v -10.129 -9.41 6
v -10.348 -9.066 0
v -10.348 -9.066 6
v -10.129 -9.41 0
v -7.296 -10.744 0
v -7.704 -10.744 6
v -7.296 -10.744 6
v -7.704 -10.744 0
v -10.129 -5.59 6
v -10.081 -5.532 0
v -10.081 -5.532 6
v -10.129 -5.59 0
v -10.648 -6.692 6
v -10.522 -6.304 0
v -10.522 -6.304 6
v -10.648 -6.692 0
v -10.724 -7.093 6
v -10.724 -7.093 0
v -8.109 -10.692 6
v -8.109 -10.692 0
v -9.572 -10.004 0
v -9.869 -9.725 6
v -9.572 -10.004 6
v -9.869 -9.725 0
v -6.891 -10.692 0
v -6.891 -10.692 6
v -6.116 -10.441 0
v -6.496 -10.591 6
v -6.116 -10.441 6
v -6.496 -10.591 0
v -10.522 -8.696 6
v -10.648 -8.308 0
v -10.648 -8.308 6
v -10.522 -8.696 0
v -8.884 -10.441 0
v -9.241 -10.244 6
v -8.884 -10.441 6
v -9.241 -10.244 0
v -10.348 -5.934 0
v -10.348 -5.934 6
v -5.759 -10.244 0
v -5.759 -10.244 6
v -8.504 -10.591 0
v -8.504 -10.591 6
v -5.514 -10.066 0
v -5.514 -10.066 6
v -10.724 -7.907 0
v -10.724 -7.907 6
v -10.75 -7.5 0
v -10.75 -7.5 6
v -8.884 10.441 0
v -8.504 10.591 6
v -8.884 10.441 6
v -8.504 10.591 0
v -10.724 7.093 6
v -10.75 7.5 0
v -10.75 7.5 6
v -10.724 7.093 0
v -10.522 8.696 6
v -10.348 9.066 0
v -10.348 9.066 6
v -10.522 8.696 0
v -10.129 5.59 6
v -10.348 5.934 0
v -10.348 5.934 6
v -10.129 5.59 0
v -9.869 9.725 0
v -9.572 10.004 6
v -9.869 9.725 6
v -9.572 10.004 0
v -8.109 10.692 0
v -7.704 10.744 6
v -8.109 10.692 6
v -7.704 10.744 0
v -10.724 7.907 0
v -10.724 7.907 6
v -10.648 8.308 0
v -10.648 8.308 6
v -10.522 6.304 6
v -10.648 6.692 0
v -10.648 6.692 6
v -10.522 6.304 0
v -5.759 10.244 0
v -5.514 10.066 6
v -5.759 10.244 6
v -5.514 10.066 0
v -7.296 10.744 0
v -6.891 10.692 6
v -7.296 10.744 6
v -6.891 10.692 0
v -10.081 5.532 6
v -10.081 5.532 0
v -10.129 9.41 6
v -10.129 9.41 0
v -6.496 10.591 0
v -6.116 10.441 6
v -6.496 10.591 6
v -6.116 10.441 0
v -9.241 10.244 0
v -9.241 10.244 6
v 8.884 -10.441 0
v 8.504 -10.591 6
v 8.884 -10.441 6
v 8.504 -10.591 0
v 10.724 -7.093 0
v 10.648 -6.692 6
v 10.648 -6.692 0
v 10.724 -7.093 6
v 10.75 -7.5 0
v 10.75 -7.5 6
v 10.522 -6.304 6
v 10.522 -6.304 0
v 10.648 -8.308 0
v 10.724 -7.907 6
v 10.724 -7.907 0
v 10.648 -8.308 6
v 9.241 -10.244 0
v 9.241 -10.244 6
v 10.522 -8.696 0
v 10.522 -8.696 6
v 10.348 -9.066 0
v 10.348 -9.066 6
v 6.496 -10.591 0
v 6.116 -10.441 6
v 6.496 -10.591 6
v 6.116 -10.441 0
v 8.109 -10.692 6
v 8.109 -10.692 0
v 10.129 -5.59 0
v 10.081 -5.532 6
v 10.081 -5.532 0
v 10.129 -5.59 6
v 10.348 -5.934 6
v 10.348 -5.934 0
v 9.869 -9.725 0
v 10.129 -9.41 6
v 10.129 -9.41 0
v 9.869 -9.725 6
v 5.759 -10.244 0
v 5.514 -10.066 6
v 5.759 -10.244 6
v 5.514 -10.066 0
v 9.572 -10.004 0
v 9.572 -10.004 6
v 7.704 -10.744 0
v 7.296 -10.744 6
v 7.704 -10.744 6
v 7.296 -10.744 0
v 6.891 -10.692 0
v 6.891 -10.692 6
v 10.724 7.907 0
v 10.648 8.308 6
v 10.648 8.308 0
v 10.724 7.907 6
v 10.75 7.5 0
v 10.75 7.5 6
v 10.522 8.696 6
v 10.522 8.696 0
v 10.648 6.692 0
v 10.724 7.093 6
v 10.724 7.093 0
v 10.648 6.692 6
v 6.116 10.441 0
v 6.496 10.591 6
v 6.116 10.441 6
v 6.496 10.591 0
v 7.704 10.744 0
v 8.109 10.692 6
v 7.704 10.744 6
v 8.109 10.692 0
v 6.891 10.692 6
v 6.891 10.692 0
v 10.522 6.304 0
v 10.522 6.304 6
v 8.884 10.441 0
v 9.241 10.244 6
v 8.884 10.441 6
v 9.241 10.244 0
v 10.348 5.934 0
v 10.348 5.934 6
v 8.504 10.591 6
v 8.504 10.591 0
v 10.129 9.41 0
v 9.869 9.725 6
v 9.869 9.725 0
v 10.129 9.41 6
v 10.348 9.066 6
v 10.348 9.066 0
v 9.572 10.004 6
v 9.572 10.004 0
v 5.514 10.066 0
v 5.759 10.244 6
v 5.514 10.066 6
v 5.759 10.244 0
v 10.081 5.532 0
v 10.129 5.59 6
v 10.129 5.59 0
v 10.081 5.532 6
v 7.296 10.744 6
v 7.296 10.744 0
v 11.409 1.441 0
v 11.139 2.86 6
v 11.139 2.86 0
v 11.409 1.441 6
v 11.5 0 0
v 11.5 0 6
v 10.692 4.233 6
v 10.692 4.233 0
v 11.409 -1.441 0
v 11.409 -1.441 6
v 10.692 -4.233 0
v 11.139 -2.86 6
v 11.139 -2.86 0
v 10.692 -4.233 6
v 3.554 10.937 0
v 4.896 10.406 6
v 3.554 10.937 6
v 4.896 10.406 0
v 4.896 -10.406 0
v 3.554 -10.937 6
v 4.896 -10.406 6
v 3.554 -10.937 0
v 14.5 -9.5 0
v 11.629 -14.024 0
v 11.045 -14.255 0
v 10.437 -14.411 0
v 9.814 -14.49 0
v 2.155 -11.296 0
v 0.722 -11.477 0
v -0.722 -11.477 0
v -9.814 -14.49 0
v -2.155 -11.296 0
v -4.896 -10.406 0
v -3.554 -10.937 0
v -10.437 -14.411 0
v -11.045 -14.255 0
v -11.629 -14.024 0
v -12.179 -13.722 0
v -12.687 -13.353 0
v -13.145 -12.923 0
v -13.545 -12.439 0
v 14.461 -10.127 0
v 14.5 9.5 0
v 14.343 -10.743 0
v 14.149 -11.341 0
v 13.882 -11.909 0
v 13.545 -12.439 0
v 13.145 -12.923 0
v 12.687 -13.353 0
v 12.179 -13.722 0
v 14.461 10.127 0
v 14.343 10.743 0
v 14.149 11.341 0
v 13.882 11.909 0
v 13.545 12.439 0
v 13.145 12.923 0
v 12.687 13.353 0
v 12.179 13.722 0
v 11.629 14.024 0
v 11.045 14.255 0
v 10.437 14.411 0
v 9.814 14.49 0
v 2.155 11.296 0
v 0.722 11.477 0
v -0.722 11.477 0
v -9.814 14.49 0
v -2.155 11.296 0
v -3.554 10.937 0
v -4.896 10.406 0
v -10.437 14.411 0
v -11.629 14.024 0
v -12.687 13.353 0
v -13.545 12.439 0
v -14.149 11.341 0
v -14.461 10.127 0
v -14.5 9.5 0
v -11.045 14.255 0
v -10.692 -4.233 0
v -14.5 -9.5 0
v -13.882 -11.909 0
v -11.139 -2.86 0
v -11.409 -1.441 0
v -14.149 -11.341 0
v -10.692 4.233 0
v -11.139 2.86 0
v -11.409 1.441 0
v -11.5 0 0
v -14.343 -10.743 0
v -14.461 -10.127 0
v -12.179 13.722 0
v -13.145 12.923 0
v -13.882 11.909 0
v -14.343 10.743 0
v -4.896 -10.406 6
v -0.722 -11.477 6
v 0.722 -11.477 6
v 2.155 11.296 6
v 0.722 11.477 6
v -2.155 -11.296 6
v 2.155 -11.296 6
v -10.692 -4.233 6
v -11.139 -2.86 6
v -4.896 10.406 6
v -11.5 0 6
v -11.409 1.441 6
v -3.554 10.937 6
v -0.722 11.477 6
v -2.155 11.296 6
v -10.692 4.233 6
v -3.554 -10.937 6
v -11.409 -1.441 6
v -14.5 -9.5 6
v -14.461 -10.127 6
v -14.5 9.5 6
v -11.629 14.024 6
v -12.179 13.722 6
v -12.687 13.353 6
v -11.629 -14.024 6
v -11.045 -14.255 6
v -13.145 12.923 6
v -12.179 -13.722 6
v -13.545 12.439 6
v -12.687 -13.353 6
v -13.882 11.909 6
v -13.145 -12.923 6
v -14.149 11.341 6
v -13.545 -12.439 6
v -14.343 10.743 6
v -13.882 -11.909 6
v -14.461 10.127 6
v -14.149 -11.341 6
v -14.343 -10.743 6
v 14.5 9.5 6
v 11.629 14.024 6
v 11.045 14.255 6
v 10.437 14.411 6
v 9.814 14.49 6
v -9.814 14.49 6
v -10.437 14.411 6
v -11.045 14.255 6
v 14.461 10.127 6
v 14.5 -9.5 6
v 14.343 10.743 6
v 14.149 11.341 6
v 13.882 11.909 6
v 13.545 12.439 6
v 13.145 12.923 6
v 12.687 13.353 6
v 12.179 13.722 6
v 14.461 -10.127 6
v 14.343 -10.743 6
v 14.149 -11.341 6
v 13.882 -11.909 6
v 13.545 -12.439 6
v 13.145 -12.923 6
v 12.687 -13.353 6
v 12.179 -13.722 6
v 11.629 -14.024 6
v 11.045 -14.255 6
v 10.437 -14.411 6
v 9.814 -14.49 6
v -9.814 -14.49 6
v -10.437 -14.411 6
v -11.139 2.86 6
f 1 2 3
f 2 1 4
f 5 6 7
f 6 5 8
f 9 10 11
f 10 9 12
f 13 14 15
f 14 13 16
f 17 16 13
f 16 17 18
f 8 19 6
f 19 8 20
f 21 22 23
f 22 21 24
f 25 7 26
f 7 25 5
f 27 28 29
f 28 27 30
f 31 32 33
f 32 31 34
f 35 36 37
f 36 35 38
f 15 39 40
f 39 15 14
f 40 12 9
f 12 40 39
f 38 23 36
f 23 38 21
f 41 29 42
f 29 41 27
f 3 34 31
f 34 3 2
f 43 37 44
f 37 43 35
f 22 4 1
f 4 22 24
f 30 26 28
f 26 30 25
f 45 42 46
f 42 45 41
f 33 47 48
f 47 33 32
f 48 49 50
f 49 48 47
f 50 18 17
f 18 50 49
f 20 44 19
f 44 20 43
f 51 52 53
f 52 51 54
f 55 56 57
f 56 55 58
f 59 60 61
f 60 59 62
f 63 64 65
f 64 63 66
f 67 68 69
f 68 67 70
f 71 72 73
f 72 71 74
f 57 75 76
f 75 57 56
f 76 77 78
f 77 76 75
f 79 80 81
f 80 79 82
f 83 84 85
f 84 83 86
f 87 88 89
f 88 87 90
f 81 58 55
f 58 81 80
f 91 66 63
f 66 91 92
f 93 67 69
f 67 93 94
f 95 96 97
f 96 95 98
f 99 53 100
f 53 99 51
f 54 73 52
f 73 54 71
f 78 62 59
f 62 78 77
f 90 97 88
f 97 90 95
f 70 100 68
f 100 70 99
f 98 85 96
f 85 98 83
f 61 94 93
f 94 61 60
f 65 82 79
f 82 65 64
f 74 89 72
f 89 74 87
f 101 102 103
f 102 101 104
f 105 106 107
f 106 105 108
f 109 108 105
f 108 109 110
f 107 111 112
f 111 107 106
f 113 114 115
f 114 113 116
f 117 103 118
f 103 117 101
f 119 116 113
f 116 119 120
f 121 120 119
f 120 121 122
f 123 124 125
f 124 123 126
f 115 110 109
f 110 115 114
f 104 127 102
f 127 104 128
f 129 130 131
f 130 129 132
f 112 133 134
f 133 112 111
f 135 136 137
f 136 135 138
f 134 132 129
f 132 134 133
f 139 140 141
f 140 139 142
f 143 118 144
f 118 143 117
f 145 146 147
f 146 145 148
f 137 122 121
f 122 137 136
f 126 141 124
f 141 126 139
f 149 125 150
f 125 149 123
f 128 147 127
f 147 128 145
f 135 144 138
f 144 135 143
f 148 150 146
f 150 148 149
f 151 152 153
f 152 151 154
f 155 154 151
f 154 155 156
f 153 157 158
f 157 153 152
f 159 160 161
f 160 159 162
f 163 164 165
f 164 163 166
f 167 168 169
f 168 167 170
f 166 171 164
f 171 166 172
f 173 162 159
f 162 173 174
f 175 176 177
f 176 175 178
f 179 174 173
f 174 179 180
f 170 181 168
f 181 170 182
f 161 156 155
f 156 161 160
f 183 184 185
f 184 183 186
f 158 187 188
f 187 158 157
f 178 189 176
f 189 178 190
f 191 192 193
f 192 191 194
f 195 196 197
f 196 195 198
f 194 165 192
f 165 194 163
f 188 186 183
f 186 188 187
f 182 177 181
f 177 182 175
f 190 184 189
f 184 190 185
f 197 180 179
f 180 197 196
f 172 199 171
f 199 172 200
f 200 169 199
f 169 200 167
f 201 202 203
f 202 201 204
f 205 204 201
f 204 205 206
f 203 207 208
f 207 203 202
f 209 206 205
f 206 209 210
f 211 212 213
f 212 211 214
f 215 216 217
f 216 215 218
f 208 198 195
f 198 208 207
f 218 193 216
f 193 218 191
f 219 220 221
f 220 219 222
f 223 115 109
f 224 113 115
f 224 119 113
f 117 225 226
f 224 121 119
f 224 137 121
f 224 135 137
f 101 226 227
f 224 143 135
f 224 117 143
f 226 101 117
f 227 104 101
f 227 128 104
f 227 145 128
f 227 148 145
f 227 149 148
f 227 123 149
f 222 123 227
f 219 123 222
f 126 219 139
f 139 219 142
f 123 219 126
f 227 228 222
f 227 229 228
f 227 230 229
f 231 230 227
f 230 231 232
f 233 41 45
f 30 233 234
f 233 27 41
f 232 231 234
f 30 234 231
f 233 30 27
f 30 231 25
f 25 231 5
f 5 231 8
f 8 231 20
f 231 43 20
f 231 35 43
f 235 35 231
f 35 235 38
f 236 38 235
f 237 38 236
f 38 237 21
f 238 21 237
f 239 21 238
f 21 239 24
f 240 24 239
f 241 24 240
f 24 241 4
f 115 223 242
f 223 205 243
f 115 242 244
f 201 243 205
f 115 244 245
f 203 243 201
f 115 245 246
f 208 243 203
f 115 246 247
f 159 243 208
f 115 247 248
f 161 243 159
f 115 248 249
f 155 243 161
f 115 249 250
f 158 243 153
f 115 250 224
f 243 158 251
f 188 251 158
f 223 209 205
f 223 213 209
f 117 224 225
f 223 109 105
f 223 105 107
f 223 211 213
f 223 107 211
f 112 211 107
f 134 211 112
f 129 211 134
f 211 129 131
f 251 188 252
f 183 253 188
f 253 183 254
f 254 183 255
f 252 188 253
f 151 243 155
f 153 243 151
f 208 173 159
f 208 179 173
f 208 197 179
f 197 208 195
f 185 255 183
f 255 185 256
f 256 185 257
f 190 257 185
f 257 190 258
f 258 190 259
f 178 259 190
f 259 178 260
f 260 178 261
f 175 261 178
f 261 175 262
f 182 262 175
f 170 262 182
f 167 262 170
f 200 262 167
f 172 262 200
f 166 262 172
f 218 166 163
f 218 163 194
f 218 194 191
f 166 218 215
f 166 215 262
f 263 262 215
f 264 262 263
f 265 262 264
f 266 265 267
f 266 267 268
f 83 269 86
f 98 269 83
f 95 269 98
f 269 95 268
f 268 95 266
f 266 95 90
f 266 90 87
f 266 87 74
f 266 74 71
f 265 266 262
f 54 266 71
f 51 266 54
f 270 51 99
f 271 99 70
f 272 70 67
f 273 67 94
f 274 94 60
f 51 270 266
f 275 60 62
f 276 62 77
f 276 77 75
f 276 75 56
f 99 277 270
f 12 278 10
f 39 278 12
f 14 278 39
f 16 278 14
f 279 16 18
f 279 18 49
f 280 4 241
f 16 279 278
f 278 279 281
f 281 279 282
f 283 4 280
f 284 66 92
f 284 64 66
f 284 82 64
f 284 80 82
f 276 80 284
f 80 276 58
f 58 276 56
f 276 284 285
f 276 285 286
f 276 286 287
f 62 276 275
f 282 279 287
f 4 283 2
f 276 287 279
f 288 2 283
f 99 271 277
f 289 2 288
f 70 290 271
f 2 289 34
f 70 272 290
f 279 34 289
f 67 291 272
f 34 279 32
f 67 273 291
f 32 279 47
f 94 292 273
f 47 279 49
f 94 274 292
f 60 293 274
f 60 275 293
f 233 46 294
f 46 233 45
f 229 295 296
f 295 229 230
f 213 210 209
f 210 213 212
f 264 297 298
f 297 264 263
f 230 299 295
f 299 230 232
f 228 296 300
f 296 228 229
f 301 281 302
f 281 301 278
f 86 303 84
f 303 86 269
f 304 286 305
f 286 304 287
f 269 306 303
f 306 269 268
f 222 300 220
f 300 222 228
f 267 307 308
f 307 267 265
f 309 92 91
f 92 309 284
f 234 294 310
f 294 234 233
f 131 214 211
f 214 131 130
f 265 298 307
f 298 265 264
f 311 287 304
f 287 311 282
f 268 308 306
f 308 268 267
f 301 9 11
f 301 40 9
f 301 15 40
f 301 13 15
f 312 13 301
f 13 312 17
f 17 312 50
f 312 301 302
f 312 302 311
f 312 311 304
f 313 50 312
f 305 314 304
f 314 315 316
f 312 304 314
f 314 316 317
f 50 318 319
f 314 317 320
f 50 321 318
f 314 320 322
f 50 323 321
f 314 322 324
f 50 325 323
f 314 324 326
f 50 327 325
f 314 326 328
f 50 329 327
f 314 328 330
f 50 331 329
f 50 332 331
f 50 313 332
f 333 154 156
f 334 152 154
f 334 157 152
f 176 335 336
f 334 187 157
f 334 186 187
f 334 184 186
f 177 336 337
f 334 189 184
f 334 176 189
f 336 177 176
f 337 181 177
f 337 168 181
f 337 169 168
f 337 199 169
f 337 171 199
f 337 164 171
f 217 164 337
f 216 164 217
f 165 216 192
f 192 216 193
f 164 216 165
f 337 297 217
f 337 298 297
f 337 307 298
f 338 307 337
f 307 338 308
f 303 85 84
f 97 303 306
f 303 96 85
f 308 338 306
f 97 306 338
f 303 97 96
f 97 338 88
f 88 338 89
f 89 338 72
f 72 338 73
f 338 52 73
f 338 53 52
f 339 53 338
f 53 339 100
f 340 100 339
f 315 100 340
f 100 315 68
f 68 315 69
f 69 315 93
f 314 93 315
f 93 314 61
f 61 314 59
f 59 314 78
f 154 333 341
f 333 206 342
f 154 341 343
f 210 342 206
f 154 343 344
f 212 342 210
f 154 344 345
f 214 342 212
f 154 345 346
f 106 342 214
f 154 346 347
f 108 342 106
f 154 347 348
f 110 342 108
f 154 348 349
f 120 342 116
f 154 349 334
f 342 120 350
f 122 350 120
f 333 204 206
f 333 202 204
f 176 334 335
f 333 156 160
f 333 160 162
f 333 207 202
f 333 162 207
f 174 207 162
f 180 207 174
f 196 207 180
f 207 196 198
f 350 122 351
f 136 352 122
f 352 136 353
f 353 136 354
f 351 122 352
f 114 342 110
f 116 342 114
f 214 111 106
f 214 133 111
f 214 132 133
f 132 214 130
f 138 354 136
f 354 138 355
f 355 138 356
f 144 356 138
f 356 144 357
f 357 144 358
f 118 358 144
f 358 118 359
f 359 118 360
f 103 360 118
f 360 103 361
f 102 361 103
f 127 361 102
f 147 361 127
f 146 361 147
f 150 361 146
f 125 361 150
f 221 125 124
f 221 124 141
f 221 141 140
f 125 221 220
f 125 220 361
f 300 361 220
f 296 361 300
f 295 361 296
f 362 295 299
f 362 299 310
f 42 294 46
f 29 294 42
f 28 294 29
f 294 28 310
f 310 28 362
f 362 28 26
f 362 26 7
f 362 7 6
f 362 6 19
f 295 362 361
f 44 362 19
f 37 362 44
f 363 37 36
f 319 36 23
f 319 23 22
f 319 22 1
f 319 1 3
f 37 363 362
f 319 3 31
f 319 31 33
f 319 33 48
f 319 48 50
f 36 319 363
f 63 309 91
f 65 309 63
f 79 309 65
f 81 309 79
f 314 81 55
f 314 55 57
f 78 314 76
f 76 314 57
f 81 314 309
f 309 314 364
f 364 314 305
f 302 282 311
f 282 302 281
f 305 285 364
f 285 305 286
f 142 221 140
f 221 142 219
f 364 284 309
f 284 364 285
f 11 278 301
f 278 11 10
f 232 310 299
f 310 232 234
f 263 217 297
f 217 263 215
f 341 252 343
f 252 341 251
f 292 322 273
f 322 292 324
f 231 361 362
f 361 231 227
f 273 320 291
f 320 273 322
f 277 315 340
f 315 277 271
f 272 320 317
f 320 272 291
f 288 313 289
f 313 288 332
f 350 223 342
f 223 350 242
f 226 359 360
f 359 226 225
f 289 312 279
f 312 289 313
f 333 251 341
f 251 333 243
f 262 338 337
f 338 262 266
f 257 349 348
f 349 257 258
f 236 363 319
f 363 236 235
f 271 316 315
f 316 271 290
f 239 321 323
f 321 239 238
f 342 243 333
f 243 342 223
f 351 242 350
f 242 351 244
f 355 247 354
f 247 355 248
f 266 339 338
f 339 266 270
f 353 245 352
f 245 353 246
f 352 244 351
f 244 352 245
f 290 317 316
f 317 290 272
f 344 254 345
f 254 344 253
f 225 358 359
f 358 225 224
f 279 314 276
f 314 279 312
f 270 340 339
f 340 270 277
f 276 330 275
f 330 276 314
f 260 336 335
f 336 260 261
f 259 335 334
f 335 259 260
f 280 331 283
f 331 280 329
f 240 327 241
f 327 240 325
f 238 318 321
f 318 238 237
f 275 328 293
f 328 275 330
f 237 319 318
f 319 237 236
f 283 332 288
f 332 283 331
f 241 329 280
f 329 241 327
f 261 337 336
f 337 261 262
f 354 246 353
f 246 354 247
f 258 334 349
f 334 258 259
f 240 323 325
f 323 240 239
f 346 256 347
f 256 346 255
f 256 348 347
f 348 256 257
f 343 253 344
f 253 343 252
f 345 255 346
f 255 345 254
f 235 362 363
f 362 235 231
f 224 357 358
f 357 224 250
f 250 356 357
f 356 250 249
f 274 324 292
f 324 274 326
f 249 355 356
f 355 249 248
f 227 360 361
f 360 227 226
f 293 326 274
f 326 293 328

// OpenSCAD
$fn = 50;


difference() {
	union() {
		hull() {
			translate(v = [-9.5000000000, 9.5000000000, 0]) {
				cylinder(h = 6, r = 5);
			}
			translate(v = [9.5000000000, 9.5000000000, 0]) {
				cylinder(h = 6, r = 5);
			}
			translate(v = [-9.5000000000, -9.5000000000, 0]) {
				cylinder(h = 6, r = 5);
			}
			translate(v = [9.5000000000, -9.5000000000, 0]) {
				cylinder(h = 6, r = 5);
			}
		}
	}
	union() {
		#translate(v = [-7.5000000000, -7.5000000000, -100.0000000000]) {
			cylinder(h = 200, r = 3.2500000000);
		}
		#translate(v = [-7.5000000000, 7.5000000000, -100.0000000000]) {
			cylinder(h = 200, r = 3.2500000000);
		}
		#translate(v = [7.5000000000, -7.5000000000, -100.0000000000]) {
			cylinder(h = 200, r = 3.2500000000);
		}
		#translate(v = [7.5000000000, 7.5000000000, -100.0000000000]) {
			cylinder(h = 200, r = 3.2500000000);
		}
		#cylinder(h = 6, r = 11.5000000000);
	}
}
